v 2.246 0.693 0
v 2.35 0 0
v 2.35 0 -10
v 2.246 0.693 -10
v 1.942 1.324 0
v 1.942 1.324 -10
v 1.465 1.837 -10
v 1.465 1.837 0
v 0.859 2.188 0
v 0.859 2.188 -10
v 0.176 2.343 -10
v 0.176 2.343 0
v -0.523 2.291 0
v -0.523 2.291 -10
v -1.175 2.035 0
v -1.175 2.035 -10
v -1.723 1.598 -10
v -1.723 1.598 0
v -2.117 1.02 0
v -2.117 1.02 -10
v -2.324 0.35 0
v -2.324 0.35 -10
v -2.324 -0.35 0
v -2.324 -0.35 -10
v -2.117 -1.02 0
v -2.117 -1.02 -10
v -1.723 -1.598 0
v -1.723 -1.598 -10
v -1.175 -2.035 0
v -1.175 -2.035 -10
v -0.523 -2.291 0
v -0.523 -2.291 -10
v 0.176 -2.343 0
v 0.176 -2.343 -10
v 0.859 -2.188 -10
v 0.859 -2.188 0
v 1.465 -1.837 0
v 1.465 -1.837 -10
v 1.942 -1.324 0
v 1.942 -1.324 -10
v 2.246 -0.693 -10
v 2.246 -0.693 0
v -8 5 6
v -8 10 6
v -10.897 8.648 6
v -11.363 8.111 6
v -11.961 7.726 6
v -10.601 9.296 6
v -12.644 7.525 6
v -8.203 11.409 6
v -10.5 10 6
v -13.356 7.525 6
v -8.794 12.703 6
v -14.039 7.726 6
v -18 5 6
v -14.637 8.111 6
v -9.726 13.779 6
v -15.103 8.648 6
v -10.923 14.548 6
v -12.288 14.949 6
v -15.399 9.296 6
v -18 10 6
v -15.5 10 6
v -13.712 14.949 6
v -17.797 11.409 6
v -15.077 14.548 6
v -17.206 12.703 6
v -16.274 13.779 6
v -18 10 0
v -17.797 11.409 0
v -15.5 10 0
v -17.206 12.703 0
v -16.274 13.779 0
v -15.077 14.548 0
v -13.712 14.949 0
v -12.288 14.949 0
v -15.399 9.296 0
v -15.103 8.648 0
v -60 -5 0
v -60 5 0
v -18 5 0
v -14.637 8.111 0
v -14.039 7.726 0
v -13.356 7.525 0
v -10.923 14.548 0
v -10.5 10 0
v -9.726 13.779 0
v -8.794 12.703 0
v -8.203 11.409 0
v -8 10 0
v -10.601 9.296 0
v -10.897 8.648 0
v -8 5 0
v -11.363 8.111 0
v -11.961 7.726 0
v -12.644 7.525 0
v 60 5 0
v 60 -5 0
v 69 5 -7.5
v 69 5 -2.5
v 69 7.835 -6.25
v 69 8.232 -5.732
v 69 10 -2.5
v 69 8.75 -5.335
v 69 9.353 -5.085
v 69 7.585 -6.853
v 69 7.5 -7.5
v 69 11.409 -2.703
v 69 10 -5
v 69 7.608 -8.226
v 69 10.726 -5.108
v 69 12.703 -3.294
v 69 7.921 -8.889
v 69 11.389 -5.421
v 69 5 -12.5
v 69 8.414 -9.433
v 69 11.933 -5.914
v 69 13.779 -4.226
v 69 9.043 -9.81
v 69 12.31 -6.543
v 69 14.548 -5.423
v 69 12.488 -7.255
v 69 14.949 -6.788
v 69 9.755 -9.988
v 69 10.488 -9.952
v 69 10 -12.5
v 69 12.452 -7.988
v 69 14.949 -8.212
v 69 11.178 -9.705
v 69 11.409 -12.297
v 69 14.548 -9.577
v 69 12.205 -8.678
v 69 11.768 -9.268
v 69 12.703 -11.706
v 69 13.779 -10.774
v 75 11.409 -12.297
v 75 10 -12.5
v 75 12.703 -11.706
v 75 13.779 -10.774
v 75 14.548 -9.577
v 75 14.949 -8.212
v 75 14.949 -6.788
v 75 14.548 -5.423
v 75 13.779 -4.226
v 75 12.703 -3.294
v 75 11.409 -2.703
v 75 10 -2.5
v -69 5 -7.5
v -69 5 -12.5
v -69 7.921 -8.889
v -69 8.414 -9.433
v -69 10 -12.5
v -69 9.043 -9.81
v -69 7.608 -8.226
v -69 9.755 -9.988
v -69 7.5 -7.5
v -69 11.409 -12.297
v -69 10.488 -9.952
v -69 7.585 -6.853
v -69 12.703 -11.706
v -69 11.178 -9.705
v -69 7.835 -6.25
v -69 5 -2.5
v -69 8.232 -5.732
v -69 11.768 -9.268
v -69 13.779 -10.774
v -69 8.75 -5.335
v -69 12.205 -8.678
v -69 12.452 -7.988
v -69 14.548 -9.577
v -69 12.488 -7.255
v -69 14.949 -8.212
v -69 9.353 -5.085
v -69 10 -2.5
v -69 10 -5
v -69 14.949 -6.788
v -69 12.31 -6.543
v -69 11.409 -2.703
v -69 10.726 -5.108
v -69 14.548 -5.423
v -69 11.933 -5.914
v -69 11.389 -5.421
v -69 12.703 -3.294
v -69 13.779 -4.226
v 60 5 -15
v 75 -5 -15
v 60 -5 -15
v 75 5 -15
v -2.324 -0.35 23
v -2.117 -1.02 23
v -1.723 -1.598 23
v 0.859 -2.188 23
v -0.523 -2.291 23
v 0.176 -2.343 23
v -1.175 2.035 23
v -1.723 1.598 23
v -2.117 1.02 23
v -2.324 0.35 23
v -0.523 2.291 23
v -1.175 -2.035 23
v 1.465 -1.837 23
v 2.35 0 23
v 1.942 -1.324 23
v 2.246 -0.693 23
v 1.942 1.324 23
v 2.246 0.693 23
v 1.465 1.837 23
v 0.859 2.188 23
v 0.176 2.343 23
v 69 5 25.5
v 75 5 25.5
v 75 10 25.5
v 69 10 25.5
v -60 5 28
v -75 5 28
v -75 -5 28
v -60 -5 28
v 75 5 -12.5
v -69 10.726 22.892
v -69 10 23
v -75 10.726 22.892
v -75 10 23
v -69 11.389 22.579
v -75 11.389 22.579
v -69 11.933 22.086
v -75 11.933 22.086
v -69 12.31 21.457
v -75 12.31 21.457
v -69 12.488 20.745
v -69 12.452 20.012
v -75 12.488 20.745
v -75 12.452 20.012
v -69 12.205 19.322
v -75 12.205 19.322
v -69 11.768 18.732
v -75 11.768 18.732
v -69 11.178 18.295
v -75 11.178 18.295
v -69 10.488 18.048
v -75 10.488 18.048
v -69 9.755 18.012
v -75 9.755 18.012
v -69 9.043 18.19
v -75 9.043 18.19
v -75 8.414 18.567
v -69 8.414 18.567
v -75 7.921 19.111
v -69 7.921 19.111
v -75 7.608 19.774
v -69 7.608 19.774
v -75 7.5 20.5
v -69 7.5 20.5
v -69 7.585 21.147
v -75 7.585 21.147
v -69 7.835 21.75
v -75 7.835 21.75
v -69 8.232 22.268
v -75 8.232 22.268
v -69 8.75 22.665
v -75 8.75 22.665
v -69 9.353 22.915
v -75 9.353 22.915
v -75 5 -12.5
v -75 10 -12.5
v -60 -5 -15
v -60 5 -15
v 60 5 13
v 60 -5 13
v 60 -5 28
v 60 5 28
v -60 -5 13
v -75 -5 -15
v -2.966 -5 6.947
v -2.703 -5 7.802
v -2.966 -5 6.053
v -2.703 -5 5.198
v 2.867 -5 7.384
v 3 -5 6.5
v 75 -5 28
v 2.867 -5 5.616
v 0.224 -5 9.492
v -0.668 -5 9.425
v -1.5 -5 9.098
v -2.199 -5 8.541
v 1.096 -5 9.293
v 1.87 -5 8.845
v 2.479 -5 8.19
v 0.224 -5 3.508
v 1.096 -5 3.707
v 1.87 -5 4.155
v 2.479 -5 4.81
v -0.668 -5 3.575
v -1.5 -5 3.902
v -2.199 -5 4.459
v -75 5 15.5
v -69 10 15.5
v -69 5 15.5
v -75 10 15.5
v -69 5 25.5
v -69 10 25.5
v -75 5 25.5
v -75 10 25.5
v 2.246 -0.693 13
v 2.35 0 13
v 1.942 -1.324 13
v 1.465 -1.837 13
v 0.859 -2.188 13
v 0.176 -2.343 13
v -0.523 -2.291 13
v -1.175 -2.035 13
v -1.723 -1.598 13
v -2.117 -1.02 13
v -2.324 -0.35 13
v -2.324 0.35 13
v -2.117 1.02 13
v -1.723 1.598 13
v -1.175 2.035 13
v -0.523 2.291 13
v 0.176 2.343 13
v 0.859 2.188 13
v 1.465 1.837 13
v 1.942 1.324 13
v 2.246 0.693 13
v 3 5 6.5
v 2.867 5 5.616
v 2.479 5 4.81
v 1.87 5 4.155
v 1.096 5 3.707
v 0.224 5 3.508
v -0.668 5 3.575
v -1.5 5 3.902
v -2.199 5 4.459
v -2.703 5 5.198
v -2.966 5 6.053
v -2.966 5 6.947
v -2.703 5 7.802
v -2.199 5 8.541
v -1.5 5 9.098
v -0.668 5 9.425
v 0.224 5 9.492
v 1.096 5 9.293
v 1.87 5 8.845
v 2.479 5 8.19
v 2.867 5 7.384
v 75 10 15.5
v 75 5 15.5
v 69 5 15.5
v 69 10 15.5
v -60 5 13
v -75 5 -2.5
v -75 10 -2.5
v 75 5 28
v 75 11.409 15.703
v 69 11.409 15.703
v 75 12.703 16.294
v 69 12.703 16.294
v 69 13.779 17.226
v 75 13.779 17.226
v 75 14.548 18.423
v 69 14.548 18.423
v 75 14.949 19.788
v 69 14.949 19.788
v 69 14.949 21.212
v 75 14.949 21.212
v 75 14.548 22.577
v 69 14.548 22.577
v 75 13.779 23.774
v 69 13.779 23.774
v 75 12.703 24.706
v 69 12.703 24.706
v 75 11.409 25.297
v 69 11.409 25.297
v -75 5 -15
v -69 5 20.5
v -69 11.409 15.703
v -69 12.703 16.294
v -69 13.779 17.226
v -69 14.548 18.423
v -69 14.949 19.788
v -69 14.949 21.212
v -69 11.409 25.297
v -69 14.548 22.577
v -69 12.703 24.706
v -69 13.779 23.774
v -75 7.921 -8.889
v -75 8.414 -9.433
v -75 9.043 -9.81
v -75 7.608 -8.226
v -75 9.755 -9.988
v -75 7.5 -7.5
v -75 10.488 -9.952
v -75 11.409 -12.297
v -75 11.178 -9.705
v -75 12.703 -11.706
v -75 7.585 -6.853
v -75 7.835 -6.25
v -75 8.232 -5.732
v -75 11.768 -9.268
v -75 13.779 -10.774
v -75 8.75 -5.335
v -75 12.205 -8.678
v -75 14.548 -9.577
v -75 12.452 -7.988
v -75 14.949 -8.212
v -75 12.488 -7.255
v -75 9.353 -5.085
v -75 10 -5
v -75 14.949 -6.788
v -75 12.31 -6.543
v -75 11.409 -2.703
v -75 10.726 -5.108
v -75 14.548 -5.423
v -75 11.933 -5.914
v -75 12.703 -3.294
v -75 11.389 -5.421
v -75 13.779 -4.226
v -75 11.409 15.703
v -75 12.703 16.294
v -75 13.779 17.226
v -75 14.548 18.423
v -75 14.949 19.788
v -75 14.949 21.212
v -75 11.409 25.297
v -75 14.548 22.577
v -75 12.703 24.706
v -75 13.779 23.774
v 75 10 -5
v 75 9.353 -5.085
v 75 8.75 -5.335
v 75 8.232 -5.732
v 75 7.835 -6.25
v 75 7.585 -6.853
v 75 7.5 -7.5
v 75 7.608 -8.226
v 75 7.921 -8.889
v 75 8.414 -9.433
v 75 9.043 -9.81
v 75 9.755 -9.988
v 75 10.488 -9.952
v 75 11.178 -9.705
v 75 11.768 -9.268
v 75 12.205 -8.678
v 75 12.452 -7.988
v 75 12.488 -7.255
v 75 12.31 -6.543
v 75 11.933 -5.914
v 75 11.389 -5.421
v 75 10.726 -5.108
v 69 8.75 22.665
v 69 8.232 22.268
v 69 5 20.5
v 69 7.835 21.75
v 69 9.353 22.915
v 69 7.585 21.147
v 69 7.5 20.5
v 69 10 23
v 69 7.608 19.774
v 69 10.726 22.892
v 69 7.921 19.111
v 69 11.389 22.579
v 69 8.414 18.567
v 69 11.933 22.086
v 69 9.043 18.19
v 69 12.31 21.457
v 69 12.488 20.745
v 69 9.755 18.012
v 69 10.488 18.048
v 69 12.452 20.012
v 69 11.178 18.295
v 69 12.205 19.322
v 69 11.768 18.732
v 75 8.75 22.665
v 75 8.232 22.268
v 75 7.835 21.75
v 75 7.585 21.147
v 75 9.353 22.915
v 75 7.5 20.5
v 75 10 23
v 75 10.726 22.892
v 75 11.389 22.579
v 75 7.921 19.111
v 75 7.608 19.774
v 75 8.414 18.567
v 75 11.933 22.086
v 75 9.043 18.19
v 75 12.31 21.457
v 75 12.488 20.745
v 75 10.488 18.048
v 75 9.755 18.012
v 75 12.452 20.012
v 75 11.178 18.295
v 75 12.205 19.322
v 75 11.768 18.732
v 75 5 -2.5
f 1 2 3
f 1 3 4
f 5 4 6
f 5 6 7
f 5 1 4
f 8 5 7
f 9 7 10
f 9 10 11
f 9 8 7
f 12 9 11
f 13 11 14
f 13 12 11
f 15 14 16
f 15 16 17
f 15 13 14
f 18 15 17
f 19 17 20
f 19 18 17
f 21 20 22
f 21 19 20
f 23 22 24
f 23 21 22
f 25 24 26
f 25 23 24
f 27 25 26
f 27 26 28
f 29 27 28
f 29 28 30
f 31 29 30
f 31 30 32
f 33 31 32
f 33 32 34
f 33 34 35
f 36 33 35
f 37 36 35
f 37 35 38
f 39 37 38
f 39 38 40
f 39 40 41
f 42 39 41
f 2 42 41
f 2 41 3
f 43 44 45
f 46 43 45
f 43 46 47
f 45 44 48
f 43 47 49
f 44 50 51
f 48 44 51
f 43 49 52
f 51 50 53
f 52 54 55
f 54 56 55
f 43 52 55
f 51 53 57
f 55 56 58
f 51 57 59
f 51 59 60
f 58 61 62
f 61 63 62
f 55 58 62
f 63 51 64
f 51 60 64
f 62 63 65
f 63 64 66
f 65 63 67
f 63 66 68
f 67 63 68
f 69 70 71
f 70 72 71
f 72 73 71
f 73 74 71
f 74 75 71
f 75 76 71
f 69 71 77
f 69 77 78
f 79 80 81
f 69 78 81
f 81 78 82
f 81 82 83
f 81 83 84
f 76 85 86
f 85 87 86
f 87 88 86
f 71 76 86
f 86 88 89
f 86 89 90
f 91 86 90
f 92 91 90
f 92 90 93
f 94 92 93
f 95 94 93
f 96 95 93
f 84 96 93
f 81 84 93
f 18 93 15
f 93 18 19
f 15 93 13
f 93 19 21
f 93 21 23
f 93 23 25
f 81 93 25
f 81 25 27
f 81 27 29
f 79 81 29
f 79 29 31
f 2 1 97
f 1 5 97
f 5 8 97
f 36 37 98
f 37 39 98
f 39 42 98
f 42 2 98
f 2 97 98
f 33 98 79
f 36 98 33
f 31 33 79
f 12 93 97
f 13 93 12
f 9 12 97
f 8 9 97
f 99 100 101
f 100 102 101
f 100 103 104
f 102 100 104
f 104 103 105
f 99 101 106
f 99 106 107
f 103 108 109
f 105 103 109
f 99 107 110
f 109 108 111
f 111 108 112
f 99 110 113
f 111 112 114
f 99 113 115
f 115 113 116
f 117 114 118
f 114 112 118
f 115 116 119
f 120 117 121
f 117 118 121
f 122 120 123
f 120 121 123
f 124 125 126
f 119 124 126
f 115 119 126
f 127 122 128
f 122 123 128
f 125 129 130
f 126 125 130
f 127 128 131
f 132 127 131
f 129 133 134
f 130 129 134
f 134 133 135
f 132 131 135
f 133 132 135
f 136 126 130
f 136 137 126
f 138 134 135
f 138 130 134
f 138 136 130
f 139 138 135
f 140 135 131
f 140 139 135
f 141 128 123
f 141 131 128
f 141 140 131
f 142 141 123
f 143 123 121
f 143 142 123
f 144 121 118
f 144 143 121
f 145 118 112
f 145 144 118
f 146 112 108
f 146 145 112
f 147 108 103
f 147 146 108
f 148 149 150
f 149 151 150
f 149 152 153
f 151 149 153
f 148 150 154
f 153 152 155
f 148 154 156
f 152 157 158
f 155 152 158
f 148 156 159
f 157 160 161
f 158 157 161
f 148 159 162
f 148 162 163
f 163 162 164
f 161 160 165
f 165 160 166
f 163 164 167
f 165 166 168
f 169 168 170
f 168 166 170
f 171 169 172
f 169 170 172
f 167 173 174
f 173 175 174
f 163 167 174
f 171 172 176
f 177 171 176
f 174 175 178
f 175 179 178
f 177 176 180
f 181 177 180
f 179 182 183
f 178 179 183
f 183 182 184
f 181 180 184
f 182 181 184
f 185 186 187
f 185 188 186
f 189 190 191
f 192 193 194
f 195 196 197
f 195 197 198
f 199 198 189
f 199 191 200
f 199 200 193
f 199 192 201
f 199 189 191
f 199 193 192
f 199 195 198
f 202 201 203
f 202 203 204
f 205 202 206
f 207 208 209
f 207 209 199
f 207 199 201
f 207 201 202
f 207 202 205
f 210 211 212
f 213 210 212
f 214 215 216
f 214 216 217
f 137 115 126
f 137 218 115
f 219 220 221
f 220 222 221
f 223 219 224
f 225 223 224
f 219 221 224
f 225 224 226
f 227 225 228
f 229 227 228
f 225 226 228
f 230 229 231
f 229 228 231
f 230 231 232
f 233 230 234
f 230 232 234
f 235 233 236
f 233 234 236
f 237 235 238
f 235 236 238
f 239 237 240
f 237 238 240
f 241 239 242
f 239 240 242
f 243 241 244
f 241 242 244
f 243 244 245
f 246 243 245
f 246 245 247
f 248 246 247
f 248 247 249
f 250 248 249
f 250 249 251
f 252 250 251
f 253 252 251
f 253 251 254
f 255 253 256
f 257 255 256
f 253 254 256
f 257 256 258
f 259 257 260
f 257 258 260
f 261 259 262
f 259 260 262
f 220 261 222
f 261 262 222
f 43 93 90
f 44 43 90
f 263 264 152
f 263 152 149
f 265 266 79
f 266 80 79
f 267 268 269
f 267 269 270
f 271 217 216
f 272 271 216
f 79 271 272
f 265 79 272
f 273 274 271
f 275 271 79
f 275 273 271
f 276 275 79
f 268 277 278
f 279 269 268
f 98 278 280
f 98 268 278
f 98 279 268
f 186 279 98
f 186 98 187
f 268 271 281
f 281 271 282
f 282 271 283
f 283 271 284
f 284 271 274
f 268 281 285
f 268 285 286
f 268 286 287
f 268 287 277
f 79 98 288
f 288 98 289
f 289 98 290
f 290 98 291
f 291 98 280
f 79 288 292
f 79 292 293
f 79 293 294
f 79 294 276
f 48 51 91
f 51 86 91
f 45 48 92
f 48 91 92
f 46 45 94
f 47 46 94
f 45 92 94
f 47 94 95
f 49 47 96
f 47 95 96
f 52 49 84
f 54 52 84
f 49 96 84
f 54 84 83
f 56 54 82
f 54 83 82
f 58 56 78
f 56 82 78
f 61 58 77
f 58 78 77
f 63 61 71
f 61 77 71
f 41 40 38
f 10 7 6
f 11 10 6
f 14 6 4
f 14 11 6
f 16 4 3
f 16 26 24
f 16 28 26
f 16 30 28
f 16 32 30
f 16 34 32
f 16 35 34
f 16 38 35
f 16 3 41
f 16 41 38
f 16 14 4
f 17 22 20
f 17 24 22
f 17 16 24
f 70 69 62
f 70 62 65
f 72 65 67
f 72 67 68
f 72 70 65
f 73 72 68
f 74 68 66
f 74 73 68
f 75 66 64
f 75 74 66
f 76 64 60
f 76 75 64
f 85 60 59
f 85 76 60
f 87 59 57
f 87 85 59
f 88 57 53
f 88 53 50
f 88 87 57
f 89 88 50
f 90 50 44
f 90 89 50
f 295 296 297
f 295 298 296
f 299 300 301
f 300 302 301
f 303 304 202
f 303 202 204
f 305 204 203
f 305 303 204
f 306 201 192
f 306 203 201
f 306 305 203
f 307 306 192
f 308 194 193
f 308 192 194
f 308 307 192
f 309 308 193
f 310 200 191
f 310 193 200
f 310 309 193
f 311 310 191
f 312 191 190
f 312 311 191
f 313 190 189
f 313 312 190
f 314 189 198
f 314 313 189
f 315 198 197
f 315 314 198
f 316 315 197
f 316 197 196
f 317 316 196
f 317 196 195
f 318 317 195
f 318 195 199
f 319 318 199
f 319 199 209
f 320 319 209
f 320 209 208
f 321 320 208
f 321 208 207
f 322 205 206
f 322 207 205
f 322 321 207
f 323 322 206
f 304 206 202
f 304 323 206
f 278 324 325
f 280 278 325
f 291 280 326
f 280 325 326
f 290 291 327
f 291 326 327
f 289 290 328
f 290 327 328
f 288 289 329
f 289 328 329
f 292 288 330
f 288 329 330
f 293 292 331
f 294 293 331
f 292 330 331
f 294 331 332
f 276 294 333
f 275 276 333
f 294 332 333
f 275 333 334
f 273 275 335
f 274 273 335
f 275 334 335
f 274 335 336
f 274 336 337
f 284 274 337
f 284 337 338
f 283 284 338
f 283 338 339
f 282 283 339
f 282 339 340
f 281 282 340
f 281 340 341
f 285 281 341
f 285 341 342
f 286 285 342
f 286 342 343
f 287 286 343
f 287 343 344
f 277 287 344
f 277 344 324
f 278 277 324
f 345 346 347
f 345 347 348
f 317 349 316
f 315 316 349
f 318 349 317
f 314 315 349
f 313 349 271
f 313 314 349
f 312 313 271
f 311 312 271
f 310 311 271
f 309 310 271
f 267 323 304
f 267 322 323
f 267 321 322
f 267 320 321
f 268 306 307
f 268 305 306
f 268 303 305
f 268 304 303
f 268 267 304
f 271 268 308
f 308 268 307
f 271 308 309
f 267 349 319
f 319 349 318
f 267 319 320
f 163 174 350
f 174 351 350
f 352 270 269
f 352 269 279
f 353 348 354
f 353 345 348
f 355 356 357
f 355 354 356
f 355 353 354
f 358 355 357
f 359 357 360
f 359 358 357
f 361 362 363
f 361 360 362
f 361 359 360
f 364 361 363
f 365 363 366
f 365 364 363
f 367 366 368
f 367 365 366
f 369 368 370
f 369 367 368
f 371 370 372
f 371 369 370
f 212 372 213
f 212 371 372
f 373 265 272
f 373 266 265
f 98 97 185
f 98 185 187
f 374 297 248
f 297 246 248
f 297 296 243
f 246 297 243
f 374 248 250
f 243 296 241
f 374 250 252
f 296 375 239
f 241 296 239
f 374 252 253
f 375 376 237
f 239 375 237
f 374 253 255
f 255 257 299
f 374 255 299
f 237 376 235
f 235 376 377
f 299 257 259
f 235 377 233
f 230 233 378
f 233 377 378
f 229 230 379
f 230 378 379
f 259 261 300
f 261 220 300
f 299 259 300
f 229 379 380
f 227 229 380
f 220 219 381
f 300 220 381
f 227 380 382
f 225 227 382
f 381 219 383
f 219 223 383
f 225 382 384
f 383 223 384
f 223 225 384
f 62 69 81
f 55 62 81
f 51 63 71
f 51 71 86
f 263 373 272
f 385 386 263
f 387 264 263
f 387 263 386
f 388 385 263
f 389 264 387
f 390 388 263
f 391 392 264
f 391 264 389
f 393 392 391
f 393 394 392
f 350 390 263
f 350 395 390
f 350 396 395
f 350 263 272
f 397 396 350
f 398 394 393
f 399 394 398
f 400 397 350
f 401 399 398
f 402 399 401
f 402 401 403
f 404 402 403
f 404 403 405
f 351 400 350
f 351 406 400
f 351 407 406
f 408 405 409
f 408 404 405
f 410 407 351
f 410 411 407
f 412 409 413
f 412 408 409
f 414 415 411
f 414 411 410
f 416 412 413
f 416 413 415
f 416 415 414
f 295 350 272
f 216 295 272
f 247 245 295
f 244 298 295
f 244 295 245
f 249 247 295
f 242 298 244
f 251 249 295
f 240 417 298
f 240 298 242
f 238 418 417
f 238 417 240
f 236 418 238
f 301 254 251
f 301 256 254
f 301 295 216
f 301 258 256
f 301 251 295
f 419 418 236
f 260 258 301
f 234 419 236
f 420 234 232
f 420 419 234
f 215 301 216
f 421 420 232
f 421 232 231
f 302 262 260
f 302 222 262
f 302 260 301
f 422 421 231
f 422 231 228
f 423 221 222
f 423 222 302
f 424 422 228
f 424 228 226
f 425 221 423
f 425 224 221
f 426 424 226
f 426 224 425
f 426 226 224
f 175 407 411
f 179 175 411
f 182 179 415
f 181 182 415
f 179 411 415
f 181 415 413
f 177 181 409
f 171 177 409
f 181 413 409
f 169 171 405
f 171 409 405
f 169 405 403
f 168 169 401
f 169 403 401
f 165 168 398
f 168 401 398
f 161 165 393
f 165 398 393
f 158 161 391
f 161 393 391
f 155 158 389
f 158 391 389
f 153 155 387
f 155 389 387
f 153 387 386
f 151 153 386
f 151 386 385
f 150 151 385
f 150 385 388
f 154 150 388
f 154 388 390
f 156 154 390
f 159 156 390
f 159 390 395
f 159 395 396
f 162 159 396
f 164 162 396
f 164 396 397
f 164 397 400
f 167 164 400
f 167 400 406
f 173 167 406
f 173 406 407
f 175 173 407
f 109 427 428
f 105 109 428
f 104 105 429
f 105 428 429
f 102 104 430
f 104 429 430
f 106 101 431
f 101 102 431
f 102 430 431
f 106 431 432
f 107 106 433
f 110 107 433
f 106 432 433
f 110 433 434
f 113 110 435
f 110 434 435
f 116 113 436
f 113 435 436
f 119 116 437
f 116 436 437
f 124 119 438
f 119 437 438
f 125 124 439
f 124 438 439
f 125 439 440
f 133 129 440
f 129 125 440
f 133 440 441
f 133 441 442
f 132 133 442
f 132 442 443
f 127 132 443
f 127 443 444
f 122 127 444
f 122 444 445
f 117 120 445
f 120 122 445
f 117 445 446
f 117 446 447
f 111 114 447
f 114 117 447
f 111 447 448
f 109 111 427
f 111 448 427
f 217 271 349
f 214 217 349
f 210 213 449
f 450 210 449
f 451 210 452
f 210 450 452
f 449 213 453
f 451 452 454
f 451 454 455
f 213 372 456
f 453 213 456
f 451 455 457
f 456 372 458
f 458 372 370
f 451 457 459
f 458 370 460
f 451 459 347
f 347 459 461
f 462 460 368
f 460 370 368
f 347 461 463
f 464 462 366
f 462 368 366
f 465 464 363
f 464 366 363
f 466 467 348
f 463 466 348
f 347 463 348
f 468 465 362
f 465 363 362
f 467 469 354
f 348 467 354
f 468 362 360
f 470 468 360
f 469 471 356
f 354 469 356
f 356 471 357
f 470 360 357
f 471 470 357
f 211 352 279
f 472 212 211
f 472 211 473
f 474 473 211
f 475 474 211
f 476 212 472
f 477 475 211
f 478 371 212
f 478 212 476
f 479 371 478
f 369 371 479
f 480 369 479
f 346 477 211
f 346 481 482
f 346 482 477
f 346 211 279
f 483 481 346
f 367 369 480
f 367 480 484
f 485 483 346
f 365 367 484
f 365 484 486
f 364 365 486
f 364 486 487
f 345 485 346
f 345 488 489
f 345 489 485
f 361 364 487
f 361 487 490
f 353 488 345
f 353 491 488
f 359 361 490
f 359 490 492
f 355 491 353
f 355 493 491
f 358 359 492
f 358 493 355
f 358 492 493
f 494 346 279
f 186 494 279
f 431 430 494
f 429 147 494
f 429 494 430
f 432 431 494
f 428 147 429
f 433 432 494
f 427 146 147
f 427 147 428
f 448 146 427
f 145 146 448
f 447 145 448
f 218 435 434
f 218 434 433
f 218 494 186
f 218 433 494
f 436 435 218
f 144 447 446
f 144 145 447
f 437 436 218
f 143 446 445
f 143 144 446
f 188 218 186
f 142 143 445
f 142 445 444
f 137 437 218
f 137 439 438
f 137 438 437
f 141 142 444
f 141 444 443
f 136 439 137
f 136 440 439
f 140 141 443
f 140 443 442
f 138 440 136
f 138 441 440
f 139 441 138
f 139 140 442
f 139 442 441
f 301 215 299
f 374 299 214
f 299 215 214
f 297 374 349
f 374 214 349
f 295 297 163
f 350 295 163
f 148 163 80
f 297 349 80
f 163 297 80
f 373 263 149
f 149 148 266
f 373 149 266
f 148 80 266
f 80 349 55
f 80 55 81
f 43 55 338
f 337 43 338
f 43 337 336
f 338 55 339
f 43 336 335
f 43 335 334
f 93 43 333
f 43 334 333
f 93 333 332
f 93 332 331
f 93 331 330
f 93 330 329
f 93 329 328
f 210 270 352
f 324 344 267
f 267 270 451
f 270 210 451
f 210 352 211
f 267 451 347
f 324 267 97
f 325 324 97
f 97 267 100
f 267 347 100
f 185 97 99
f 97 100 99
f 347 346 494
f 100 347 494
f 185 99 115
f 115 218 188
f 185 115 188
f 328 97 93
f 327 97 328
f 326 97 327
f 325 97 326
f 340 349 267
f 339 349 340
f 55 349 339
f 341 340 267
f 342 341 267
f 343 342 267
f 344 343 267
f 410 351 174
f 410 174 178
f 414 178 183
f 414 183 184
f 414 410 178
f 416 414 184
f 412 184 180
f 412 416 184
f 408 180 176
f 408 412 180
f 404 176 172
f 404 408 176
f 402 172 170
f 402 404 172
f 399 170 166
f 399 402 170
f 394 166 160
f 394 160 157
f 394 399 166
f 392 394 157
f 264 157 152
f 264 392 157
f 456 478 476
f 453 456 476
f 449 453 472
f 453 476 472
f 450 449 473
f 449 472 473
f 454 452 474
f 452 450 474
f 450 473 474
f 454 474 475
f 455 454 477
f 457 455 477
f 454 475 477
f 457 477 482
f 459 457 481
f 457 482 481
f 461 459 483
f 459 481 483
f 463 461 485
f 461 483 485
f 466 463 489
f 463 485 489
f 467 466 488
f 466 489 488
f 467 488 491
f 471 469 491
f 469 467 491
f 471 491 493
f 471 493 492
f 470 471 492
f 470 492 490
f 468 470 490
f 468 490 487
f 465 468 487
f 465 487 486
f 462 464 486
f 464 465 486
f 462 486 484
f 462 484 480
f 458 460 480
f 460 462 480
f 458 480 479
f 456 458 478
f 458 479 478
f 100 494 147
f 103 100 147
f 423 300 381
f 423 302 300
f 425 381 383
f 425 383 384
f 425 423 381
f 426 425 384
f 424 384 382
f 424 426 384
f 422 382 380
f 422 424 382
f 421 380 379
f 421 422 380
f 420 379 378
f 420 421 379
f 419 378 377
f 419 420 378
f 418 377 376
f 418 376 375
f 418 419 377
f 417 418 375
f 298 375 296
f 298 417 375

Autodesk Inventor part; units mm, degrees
ref_plane "YZ Plane" through (0, 0, 0) normal (1, 0, 0) x (0, 1, 0)
sketch "Sketch1" plane through (0, 0, 0) normal (0, 0, 1) x (1, 0, 0)
  line L0 (-5, 5) -> (5, 5)
  line L1 (5, 5) -> (5, -5)
  line L2 (5, -5) -> (-5, -5)
  line L3 (-5, -5) -> (-5, 5)
  line L4 (-5, 5) -> (5, -5) construction
  line L5 (5, 5) -> (-5, -5) construction
  point P0 (0, 0)
  dimension "d0" = 10
  dimension "d1" = 10
extrude "Extrusion1" add sketch "Sketch1" along normal blind 13
sketch "Sketch2" plane through (0, 0, 13) normal (0, 0, 1) x (1, 0, 0)
  circle A0 centre (0, 0) radius 2.35
  dimension "d4" = 4.7
extrude "Extrusion2" add sketch "Sketch2" along normal blind 10
ref_plane "Work Plane1" through (0, 0, 6.5) normal (0, 0, 1) x (1, 0, 0)
mirror "Mirror1" about plane through (0, 0, 6.5) normal (0, 0, 1) of "Extrusion2"
sketch "Sketch3" plane through (-5, 5, 0) normal (0, 1, 0) x (1, 0, 0)
  line L0 (0, 0) -> (0, -13) projected
  line L1 (0, -6.5) -> (10, -6.5)
  line L2 (10, 0) -> (10, -13) projected
  circle A0 centre (5, -6.5) radius 3
  point P0 (5, 0)
  dimension "d7" = 6
extrude "Extrusion3" cut sketch "Sketch3" against normal through all
sketch "Sketch4" plane through (5, -5, 0) normal (1, 0, 0) x (0, 0, -1)
  line L0 (0, 0) -> (0, 10) projected
  line L1 (0, 10) -> (-13, 10) projected
  line L2 (-13, 0) -> (-13, 10) projected
  line L3 (0, 0) -> (-13, 0) projected
  point P0 (0, 5)
extrude "Extrusion4" add sketch "Sketch4" along normal blind 70
mirror "Mirror2" about plane through (0, 0, 0) normal (1, 0, 0) of "Extrusion4"
sketch "Sketch5" plane through (0, 0, 13) normal (0, 0, 1) x (1, 0, 0)
  line L0 (-75, 5) -> (75, 5) projected
  line L1 (0, 5) -> (0, -5)
  line L2 (75, -5) -> (-75, -5) projected
  line L3 (-75, 5) -> (-75, -5) projected
  line L4 (-75, -5) -> (-75, 5)
  line L5 (-60, -5) -> (-60, 5)
  line L6 (75, 5) -> (75, -5)
  line L7 (60, -5) -> (60, 5)
  point P0 (0, 0)
  dimension "d12" = 15
extrude "Extrusion5" add sketch "Sketch5" along normal blind 15 contours L0 L5 L2 L3 | L0 L6 L2 L7
ref_plane "Work Plane2" through (0, 0, 6.5) normal (0, 0, -1) x (-1, 0, 0)
mirror "Mirror3" about plane through (0, 0, 6.5) normal (0, 0, -1) of "Extrusion5"
sketch "Sketch6" plane through (-75, -5, 28) normal (-1, 0, 0) x (0, 0, 1)
  line L0 (-28, 10) -> (-43, 10) projected
  line L1 (-15, 10) -> (0, 10) projected
  line L2 (0, 10) -> (-43, 10) projected
  line L3 (-28, 10) -> (-43, 10)
  line L4 (-35.5, 10) -> (-35.5, 15)
  circle A0 centre (-35.5, 15) radius 2.5
  circle A1 centre (-35.5, 15) radius 5
  line L5 (-40.5, 15) -> (-40.5, 10)
  line L6 (-30.5, 15) -> (-30.5, 10)
  line L7 (-40.5, 10) -> (-30.5, 10)
  line L8 (-18.5, 0) -> (-24.5, 0) projected
  line L9 (-21.5, 0) -> (-21.5, 20.3601)
  line L10 (-15, 10) -> (0, 10)
  line L11 (-7.5, 10) -> (-7.5, 15)
  circle A2 centre (-7.5, 15) radius 2.5
  circle A3 centre (-7.5, 15) radius 5
  line L12 (-2.5, 15) -> (-2.5, 10)
  line L13 (-12.5, 15) -> (-12.5, 10)
  point P0 (-28, 5)
  dimension "d15" = 5
  dimension "d16" = 5
  dimension "d17" = 10
extrude "Extrusion6" add sketch "Sketch6" against normal blind 6
mirror "Mirror4" about plane through (0, 0, 0) normal (1, 0, 0) of "Extrusion6"
sketch "Sketch8" plane through (0, 0, 0) normal (0, 0, -1) x (-1, 0, 0)
  line L0 (3, -96.3437) -> (3, 27.6563)
  line L1 (60, 5) -> (-60, 5) projected
  line L2 (3, 5) -> (8, 5)
  line L3 (8, 5) -> (8, 10)
  circle A0 centre (13, 10) radius 5
  line L4 (60, 5) -> (-60, 5) projected
  line L5 (18, 10) -> (18, 5)
  circle A1 centre (13, 10) radius 2.5
  point P0 (0, 0)
  dimension "d22" = 10
  dimension "d20" = 5
  dimension "d21" = 5
  dimension "d23" = 5
extrude "Extrusion7" add sketch "Sketch8" against normal blind 6
sketch "Sketch9" plane through (0, 0, 6) normal (0, 0, 1) x (1, 0, 0)
  arc A0 (-8, 10) -> (-18, 10) centre (-13, 10) ccw projected
  line L0 (-18, 10) -> (-8, 10)
  point P0 (0, 0)
extrude "Extrusion8" add sketch "Sketch9" against normal up to surface (6 mm away)
properties part number "Claw Connector 2"
